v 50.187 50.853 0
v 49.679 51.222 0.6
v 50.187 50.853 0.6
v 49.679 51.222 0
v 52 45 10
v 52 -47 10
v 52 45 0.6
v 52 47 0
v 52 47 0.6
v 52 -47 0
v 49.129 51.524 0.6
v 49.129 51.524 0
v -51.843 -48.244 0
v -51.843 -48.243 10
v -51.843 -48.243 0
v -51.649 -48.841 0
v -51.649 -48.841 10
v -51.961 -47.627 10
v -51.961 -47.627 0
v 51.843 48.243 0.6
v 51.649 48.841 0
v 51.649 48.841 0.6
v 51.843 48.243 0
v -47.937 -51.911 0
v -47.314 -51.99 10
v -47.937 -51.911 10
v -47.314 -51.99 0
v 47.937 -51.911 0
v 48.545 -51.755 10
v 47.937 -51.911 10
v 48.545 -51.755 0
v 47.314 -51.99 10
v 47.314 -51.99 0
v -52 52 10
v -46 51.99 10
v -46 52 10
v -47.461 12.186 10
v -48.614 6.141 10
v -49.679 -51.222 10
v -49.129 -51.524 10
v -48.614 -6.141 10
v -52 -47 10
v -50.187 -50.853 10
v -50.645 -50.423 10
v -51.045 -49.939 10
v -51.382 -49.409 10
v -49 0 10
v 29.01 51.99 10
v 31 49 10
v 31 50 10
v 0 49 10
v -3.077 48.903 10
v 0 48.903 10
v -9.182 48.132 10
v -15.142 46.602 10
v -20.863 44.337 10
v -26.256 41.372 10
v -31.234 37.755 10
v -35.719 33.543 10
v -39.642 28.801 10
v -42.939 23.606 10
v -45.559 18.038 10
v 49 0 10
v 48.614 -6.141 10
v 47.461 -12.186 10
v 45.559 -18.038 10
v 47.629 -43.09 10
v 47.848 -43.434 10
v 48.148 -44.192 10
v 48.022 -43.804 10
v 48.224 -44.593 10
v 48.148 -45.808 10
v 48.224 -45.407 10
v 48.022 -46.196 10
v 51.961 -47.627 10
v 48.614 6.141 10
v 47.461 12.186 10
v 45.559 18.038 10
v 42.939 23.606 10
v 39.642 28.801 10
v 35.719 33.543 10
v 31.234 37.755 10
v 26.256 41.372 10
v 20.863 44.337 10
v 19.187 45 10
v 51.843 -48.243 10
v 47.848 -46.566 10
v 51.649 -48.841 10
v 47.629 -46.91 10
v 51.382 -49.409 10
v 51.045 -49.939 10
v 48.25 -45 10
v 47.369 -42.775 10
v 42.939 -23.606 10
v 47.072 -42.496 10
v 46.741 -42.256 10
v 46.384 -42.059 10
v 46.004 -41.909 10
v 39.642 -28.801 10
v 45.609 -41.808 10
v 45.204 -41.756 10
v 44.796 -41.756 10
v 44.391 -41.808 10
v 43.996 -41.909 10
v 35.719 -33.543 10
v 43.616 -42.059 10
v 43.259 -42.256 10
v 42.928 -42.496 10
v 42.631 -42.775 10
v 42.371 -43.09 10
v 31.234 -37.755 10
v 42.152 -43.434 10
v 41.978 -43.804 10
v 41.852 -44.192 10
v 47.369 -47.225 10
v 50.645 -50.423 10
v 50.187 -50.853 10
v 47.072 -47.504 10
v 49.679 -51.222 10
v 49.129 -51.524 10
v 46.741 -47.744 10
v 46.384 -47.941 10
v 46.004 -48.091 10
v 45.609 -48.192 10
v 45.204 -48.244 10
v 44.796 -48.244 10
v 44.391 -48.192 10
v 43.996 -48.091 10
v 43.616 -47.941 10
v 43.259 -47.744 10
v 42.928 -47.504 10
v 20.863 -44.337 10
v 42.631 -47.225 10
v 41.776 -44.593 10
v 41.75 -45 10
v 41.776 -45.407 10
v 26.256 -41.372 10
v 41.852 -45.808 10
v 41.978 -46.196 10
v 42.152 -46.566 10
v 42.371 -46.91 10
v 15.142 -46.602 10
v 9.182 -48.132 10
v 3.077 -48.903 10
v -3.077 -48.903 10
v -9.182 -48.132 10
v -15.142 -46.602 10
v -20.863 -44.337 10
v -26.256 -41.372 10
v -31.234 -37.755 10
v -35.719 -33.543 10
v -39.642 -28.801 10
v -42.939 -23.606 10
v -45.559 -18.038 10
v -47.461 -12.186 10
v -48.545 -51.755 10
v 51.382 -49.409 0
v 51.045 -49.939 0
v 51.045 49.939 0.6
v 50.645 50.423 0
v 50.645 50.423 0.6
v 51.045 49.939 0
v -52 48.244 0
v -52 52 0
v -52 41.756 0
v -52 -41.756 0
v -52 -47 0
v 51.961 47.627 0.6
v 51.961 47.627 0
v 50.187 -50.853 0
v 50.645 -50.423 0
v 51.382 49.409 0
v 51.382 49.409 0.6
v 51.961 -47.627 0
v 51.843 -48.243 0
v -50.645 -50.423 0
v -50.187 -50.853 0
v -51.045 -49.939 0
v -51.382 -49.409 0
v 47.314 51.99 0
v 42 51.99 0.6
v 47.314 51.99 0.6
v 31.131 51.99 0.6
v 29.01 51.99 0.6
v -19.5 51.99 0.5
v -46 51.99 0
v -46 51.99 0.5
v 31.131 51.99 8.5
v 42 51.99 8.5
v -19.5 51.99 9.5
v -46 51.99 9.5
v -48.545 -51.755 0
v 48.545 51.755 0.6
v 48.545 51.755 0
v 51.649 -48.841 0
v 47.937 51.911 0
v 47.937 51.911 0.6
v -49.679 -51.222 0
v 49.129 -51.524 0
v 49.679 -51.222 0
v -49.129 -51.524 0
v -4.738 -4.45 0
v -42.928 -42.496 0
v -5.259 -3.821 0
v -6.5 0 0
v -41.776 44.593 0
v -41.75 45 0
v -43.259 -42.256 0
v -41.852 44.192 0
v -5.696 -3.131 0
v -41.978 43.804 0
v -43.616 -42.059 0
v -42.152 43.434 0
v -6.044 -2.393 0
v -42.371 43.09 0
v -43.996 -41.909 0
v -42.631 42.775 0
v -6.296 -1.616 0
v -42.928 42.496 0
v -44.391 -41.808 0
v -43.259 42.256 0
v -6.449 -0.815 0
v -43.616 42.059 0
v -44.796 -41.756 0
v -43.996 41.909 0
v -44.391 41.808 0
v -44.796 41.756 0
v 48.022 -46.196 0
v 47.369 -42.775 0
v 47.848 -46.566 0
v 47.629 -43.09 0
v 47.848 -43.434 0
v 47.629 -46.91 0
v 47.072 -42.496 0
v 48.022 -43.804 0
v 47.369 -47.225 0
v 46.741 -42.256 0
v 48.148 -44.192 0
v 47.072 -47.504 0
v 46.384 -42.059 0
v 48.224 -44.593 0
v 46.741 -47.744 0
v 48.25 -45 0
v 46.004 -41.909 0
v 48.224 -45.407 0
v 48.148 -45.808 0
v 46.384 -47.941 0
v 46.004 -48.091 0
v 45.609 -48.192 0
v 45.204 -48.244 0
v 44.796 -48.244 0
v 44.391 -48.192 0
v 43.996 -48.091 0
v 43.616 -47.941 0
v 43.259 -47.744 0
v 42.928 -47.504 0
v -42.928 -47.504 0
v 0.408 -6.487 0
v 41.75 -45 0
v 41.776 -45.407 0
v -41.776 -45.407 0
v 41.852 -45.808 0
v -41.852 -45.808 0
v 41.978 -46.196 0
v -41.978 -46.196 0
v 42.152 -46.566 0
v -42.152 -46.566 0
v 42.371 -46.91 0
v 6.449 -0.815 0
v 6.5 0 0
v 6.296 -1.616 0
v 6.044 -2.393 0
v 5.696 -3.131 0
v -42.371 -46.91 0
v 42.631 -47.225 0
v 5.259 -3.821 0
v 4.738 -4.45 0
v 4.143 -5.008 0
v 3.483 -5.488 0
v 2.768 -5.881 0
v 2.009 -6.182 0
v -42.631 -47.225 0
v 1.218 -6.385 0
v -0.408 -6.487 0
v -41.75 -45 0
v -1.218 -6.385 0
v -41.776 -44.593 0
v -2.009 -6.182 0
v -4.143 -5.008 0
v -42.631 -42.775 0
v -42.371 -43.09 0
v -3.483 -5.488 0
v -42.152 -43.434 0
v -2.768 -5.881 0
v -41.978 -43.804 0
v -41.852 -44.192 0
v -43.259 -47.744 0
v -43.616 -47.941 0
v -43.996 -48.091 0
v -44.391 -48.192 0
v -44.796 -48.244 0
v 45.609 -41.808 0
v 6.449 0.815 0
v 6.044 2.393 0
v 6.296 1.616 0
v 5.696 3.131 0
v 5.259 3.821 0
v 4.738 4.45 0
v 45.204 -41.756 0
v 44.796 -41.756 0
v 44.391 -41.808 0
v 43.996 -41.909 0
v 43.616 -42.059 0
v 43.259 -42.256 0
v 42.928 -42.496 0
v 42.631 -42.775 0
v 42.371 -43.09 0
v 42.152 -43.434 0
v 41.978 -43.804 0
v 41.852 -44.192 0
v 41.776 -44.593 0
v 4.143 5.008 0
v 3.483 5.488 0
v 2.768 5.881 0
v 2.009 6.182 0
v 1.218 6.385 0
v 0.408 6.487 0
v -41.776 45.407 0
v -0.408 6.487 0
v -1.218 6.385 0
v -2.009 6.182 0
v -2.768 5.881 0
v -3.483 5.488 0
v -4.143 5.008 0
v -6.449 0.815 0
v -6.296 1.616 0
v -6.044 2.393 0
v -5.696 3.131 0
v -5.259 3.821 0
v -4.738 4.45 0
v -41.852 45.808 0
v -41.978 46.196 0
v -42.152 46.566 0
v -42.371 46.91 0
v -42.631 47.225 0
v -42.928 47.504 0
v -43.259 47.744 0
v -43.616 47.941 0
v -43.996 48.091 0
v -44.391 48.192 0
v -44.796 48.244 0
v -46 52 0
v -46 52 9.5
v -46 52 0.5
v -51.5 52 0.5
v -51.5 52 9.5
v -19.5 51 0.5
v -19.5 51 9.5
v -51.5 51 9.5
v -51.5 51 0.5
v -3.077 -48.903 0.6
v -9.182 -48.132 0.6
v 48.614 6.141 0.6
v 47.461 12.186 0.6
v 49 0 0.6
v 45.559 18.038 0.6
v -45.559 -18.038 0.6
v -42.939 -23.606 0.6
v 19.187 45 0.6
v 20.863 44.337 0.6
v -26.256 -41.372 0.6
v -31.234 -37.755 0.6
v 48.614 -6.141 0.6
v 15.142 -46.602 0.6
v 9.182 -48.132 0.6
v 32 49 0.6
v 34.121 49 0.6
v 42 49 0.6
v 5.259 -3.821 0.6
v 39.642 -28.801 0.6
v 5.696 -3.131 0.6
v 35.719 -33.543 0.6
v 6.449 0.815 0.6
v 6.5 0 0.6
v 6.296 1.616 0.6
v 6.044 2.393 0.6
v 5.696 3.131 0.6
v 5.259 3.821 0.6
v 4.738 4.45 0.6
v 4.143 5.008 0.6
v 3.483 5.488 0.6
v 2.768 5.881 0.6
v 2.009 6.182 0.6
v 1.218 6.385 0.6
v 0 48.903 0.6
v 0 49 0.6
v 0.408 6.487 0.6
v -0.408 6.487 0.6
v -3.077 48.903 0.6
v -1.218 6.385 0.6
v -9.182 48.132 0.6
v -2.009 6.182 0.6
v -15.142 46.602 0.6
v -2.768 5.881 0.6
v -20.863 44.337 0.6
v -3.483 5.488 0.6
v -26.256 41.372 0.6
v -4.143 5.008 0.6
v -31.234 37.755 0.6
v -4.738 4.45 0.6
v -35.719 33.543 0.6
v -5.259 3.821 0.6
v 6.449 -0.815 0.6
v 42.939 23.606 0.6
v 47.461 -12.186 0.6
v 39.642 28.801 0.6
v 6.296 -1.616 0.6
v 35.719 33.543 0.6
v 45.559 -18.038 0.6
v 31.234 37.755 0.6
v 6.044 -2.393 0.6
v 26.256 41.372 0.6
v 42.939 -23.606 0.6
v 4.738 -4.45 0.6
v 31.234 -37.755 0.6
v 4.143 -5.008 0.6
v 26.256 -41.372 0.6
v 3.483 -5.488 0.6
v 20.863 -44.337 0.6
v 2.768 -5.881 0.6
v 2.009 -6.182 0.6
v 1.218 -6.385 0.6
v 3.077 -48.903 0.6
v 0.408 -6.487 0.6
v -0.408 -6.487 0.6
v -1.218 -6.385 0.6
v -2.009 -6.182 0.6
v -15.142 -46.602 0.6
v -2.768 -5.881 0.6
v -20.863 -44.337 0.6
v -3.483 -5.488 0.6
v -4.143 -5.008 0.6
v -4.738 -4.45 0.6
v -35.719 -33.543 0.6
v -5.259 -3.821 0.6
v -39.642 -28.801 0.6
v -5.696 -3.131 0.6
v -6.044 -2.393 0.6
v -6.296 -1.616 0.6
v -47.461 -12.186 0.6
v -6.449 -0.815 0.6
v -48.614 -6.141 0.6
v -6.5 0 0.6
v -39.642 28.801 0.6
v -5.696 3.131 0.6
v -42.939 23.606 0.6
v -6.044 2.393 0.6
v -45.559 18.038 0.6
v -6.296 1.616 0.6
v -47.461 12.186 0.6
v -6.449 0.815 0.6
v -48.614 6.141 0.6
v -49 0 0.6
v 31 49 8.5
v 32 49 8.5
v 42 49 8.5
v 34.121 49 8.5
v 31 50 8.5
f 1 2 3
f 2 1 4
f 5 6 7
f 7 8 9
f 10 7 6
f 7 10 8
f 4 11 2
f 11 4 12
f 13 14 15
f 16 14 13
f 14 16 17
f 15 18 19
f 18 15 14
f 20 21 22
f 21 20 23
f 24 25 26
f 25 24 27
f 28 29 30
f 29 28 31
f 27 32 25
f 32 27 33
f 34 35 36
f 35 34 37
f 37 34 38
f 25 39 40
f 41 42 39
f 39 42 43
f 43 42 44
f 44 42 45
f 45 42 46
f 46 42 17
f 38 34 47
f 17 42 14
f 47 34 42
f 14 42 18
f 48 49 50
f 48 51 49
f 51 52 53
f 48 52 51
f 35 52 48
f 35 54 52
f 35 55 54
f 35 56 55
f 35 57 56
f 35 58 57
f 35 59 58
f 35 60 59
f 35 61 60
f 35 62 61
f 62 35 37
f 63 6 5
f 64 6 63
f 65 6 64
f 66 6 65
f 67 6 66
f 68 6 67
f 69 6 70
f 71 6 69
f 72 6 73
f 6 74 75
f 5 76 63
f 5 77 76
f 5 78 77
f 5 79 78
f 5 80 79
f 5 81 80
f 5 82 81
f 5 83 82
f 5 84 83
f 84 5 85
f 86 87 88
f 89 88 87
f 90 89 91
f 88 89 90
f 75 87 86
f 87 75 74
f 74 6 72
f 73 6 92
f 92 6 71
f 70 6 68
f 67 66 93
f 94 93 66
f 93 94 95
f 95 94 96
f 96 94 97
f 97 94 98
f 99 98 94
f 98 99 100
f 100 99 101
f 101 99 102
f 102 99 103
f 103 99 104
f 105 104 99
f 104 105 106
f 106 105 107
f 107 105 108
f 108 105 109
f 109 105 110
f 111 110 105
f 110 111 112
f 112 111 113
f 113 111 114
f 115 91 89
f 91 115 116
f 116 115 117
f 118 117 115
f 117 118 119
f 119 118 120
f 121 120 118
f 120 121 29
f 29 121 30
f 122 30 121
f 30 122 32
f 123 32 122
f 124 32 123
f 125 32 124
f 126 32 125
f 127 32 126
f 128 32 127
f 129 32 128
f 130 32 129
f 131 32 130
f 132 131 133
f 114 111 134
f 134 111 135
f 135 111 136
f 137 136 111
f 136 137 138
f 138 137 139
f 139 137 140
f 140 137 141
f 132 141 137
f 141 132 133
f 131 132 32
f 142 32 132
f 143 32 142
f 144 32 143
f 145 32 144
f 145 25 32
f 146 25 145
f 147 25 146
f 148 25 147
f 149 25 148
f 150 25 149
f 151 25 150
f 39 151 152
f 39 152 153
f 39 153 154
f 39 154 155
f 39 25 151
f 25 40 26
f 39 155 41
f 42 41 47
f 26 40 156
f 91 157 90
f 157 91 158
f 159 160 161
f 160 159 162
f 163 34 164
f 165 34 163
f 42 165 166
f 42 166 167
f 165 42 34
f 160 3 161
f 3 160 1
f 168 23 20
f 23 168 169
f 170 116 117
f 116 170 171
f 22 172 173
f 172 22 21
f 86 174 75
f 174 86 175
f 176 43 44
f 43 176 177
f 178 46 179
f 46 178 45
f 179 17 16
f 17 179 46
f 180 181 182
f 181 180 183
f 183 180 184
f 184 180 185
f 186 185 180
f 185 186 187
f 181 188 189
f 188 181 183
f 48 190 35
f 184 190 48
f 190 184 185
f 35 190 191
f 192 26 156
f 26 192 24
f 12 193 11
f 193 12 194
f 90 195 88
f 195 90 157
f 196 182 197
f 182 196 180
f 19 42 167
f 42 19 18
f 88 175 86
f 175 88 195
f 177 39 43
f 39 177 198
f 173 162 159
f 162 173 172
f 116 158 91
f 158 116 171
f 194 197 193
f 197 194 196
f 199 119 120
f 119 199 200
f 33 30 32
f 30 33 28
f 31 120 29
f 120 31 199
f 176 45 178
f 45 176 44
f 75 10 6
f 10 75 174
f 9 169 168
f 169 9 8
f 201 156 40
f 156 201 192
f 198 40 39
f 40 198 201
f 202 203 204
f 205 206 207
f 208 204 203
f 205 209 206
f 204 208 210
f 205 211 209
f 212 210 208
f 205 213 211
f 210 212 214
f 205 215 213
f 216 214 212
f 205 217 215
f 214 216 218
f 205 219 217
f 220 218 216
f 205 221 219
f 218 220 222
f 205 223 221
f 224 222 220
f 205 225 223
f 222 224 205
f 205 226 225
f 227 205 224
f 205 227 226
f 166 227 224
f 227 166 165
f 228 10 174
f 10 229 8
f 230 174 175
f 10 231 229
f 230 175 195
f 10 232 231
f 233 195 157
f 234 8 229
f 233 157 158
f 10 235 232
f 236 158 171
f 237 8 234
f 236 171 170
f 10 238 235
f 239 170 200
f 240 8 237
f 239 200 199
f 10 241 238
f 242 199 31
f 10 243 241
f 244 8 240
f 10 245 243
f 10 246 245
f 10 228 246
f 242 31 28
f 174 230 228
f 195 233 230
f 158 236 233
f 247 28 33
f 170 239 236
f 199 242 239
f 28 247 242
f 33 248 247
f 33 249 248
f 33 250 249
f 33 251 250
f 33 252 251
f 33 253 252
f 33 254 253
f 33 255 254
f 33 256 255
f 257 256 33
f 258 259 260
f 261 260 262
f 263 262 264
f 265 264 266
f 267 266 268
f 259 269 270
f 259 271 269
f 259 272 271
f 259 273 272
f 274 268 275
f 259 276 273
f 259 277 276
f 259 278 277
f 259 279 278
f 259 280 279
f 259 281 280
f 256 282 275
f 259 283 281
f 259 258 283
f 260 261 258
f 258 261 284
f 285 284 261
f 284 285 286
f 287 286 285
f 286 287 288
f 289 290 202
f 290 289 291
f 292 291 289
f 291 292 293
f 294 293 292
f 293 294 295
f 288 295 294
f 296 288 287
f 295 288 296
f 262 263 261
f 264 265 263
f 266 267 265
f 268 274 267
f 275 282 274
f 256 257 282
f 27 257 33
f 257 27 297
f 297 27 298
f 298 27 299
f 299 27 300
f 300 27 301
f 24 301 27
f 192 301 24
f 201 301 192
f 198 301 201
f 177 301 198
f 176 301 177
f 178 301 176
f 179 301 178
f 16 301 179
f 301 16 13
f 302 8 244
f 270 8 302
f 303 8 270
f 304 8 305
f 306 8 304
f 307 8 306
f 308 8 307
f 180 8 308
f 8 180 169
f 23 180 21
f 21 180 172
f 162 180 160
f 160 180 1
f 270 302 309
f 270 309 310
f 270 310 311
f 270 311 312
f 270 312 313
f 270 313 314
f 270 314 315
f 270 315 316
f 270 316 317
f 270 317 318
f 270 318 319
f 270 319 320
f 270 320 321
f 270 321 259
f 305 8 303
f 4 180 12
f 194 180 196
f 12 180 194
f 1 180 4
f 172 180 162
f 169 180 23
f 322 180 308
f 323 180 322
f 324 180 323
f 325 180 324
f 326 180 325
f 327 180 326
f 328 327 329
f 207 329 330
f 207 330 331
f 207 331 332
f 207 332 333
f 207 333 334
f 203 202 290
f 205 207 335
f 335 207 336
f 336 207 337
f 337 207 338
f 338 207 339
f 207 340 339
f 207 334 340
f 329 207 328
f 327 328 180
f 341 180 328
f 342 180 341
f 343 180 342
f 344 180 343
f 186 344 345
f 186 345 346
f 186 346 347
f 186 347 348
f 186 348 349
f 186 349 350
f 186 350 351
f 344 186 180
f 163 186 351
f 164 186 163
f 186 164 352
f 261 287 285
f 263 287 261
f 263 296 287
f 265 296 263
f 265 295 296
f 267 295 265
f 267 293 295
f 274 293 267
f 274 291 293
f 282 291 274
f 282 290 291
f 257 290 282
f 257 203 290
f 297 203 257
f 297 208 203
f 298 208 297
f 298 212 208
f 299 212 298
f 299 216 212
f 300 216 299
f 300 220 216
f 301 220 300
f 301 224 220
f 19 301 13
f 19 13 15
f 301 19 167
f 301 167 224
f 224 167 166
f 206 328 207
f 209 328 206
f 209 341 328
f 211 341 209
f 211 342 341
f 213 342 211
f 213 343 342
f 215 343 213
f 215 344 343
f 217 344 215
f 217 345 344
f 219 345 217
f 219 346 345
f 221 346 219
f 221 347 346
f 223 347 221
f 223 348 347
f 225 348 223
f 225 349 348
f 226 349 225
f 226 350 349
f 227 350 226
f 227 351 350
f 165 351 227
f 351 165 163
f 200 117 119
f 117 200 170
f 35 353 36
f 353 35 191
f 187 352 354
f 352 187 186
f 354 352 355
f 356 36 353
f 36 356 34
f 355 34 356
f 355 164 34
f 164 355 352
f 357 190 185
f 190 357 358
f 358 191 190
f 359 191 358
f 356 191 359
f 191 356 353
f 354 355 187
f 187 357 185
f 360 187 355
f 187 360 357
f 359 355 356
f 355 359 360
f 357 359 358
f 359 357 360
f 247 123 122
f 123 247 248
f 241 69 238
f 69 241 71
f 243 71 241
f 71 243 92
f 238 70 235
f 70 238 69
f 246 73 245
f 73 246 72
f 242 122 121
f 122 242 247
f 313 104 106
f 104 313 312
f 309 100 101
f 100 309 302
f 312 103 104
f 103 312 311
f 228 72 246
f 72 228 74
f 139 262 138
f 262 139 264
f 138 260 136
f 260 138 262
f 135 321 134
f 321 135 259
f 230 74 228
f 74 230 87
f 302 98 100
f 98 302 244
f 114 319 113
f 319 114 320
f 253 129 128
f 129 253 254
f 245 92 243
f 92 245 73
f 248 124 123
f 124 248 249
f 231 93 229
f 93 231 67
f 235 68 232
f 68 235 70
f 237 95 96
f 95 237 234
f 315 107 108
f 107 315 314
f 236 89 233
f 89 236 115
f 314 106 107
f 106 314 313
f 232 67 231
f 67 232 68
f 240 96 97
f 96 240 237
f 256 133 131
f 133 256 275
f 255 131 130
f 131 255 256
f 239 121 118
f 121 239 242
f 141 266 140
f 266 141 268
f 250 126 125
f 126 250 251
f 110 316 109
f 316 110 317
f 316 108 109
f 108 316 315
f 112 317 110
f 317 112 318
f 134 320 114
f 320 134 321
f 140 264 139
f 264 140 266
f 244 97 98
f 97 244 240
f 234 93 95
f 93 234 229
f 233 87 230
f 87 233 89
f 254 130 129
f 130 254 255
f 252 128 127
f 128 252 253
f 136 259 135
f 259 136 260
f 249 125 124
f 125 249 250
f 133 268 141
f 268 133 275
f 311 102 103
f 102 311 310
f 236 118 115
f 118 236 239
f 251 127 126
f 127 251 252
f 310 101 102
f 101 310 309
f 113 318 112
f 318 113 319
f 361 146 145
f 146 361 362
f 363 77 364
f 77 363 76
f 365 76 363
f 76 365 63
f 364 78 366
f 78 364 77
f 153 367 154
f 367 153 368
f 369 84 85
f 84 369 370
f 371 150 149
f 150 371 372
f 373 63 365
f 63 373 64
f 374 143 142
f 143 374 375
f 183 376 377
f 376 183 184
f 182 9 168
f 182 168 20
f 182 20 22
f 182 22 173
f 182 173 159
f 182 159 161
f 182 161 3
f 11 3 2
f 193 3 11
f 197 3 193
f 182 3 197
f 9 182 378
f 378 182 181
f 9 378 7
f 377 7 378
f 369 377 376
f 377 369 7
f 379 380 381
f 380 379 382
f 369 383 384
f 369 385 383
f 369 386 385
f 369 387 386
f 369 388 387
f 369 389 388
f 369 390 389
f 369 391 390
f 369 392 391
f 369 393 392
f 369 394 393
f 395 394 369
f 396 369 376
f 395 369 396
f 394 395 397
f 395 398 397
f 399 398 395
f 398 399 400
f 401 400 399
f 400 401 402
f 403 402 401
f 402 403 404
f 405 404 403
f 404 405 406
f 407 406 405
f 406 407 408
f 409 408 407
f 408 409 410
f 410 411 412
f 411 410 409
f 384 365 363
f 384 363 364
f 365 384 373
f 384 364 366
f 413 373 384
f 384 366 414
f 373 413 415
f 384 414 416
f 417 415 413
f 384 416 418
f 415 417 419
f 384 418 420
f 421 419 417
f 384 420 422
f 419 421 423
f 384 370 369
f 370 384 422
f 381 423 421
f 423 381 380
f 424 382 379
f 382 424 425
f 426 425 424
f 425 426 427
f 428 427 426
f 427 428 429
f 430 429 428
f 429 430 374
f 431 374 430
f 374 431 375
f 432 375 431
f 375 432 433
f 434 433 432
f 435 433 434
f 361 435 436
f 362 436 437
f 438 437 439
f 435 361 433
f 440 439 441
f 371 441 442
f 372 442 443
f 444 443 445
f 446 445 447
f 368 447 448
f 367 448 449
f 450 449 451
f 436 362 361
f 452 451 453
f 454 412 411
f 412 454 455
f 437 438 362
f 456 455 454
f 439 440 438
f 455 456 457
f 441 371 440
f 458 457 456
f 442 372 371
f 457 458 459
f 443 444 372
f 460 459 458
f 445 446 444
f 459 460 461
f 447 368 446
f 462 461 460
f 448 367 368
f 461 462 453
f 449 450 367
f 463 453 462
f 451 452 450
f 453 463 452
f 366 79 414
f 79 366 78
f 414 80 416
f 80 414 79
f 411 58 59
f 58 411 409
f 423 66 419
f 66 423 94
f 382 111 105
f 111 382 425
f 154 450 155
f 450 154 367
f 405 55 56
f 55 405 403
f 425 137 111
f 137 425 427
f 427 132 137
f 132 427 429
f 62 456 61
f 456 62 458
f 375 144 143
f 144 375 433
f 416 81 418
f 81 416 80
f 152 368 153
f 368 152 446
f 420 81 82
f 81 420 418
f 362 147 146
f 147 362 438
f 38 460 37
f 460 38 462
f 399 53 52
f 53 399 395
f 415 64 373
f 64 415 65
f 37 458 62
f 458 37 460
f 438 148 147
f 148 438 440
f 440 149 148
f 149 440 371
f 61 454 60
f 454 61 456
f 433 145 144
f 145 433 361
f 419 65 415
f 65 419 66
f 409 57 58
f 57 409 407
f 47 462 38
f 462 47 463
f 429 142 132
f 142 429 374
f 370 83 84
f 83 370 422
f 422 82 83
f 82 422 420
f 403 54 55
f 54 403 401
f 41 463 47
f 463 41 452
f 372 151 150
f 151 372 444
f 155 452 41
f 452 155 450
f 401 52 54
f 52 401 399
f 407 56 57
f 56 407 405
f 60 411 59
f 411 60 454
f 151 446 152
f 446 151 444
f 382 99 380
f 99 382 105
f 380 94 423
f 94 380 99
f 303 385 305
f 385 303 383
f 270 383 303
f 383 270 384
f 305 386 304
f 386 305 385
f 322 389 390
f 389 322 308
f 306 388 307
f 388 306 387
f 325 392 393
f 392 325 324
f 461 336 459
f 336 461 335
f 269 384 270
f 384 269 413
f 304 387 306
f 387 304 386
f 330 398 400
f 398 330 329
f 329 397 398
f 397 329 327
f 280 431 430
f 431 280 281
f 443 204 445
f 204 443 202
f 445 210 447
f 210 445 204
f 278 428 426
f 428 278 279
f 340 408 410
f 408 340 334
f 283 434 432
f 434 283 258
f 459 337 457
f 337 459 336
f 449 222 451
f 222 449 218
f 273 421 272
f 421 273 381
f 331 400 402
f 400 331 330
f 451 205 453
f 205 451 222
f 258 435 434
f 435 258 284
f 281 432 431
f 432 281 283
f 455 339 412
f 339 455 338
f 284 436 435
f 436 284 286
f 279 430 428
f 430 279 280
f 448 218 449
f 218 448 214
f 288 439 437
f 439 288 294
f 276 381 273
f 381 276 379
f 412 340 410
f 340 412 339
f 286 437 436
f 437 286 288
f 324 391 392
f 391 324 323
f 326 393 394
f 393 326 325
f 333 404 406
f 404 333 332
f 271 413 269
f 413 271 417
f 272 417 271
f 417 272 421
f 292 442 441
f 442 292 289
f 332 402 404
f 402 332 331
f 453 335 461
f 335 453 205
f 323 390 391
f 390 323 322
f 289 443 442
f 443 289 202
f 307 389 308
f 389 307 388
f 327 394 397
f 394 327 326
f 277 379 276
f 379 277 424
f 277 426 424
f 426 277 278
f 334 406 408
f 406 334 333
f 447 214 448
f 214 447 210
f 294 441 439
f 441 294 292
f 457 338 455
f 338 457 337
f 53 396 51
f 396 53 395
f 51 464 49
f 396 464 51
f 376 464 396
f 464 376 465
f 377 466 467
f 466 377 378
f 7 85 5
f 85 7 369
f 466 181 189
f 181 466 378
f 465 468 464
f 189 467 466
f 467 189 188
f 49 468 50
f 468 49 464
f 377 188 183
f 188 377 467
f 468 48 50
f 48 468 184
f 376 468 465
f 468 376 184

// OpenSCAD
$fn = 50;


difference() {
	union() {
		hull() {
			translate(v = [-47.0000000000, 47.0000000000, 0]) {
				cylinder(h = 10, r = 5);
			}
			translate(v = [47.0000000000, 47.0000000000, 0]) {
				cylinder(h = 10, r = 5);
			}
			translate(v = [-47.0000000000, -47.0000000000, 0]) {
				cylinder(h = 10, r = 5);
			}
			translate(v = [47.0000000000, -47.0000000000, 0]) {
				cylinder(h = 10, r = 5);
			}
		}
		translate(v = [-52.0000000000, 46.0000000000, 0]) {
			cube(size = [6, 6, 10]);
		}
	}
	union() {
		translate(v = [-52.5000000000, -45.0000000000, -250.0000000000]) {
			rotate(a = [0, 0, 0]) {
				difference() {
					union() {
						hull() {
							translate(v = [7.5000000000, 0, 0]) {
								cylinder(h = 250, r = 3.2500000000, r1 = 3.2500000000, r2 = 3.2500000000);
							}
							translate(v = [-7.5000000000, 0, 0]) {
								cylinder(h = 250, r = 3.2500000000, r1 = 3.2500000000, r2 = 3.2500000000);
							}
						}
					}
					union();
				}
			}
		}
		translate(v = [-52.5000000000, 45.0000000000, -250.0000000000]) {
			rotate(a = [0, 0, 0]) {
				difference() {
					union() {
						hull() {
							translate(v = [7.5000000000, 0, 0]) {
								cylinder(h = 250, r = 3.2500000000, r1 = 3.2500000000, r2 = 3.2500000000);
							}
							translate(v = [-7.5000000000, 0, 0]) {
								cylinder(h = 250, r = 3.2500000000, r1 = 3.2500000000, r2 = 3.2500000000);
							}
						}
					}
					union();
				}
			}
		}
		translate(v = [-51.5000000000, 51.0000000000, 0.5000000000]) {
			cube(size = [32, 1, 9.0000000000]);
		}
		translate(v = [45.0000000000, -45.0000000000, -50.0000000000]) {
			cylinder(h = 100, r = 3.2500000000);
		}
		translate(v = [0, 0, 0.6000000000]) {
			cylinder(h = 12.4000000000, r = 49.0000000000);
		}
		translate(v = [0, 0, -5.0000000000]) {
			cylinder(h = 10, r = 6.5000000000);
		}
		translate(v = [0.0000000000, 45.0000000000, 0.6000000000]) {
			cube(size = [52.0000000000, 4, 12.4000000000]);
		}
		translate(v = [42.0000000000, 45.0000000000, 0.6000000000]) {
			cube(size = [10, 7, 12.4000000000]);
		}
		translate(v = [31.0000000000, 45.0000000000, 8.5000000000]) {
			cube(size = [21, 7, 1.5000000000]);
		}
		translate(v = [28.2500000000, 52.7500000000, 0.6000000000]) {
			rotate(a = [0, 0, -45]) {
				cube(size = [7.5000000000, 1.5000000000, 12.4000000000]);
			}
		}
		translate(v = [11.0610000000, 43.0000000000, 0.6000000000]) {
			cube(size = [7.5000000000, 2, 9.4000000000]);
		}
	}
}
